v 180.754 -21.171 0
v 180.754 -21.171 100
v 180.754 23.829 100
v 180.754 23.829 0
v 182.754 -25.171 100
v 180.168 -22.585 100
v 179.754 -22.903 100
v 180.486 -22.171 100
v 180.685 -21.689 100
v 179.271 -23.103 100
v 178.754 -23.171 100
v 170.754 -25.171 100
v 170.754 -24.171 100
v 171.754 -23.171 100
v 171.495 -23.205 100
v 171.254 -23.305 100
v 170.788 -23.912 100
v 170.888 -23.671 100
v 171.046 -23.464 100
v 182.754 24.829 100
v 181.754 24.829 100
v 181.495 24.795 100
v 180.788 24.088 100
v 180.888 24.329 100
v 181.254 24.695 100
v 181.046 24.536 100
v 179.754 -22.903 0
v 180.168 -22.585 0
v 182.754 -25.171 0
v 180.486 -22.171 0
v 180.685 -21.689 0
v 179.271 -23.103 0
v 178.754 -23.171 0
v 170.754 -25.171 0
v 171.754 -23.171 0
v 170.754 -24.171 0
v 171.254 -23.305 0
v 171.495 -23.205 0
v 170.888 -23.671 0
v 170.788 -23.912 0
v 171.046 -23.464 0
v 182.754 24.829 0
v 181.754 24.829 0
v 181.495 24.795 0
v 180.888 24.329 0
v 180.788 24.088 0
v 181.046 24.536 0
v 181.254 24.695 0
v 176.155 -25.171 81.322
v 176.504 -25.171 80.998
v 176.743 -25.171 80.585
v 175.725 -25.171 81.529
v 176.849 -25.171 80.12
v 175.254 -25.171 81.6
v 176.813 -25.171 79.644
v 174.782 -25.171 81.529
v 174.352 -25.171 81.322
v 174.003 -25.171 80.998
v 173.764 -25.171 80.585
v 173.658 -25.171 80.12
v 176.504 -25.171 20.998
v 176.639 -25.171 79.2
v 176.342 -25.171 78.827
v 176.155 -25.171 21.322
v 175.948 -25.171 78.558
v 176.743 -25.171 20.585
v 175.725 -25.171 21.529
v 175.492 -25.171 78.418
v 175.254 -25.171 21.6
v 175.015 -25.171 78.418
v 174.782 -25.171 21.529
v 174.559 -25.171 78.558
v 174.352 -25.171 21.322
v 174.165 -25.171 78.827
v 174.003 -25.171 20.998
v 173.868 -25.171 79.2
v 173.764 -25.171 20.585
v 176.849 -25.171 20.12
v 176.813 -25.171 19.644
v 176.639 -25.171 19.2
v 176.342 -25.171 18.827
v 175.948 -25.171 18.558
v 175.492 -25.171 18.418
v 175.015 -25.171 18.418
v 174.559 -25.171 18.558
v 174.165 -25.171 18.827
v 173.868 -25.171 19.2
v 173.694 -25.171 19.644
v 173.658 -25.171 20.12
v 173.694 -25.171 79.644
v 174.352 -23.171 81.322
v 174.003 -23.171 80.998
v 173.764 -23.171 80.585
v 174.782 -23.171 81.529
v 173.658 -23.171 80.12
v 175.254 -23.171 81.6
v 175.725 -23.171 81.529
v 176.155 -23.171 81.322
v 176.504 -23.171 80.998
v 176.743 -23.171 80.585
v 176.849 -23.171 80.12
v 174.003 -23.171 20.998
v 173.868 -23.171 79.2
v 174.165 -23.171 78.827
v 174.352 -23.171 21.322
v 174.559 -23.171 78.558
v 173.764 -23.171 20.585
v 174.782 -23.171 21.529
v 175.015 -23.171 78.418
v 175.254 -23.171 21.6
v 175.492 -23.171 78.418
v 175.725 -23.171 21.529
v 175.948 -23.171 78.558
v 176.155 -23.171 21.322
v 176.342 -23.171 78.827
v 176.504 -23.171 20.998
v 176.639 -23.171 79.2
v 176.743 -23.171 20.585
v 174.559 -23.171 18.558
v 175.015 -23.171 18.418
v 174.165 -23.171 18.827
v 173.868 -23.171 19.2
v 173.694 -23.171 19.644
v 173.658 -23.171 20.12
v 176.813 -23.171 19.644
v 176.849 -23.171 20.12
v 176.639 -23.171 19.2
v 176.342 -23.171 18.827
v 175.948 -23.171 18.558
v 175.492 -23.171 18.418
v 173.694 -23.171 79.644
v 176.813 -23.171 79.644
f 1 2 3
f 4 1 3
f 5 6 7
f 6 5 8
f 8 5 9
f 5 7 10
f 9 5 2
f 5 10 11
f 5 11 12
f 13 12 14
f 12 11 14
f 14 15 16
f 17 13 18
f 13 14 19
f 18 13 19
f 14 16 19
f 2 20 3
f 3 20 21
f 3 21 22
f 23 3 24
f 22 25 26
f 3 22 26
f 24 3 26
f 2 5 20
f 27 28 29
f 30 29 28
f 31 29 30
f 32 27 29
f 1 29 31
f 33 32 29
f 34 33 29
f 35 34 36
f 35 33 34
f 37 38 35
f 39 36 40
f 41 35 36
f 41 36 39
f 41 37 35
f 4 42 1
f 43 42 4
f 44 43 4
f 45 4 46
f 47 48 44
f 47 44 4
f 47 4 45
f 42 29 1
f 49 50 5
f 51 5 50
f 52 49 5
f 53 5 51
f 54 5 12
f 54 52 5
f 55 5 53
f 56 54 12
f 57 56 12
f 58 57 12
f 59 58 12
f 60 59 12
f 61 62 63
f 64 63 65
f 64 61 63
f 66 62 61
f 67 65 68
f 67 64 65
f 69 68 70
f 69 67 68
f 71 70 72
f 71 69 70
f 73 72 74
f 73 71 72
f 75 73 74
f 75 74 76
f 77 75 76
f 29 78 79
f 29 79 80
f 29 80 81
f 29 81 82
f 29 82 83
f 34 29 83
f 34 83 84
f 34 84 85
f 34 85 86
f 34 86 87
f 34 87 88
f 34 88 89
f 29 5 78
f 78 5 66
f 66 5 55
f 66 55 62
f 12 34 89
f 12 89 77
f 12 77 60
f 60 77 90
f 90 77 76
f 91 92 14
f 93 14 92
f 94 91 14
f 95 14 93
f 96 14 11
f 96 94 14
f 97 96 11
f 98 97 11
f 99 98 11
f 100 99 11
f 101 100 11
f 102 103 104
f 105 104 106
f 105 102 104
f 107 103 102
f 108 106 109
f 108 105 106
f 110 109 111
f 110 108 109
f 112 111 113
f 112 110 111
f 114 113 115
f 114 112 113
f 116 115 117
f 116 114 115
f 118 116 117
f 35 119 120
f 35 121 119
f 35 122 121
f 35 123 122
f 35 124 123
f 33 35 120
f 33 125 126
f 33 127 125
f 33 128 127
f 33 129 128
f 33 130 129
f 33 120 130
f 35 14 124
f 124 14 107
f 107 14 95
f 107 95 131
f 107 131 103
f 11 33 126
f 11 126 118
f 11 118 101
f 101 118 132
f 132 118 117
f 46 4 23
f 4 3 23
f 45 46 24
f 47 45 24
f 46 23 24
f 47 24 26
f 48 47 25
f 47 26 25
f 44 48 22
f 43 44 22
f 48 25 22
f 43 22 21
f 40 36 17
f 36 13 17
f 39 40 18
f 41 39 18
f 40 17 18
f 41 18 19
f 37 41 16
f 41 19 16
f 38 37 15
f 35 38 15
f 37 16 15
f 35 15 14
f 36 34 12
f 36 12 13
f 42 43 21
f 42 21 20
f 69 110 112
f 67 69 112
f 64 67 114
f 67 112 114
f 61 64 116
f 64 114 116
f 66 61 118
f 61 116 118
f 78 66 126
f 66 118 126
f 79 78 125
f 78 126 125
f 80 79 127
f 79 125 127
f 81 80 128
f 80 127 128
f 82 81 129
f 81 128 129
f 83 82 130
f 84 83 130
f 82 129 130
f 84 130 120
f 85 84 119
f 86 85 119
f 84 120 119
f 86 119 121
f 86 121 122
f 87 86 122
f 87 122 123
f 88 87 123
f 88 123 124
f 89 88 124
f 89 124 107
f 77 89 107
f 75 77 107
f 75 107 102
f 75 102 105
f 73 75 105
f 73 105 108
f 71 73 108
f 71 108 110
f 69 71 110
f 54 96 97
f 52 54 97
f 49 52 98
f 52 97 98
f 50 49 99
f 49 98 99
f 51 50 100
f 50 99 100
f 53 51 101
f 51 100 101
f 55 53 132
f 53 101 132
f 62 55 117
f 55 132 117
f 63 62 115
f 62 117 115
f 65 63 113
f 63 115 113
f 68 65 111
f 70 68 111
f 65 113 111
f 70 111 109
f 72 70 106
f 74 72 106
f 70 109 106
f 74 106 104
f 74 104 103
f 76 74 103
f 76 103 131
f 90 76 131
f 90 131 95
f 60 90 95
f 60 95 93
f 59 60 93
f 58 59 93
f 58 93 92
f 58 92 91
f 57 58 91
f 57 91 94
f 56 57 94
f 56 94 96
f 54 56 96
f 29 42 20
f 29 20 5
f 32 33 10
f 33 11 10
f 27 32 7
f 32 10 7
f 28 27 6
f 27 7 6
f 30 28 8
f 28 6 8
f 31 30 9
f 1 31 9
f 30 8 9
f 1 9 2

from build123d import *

# Parameters (mm, degrees)
BOSS_EXTRUDE1_DEPTH = 100
FILLET2_R           = 1
FILLET3_R           = 2
SKETCH3_R           = 1.6
CUT_EXTRUDE1_DEPTH  = 214.782256883


with BuildPart() as part:
    # Sketch2 → Boss-Extrude1 (new body)
    with BuildSketch(Plane.XY):
        Polygon((182.753531726, 24.828838313), (182.753531726, -25.171161687), (170.753531726, -25.171161687), (170.753531726, -23.171161687), (180.753531726, -23.171161687), (180.753531726, 24.828838313), align=None)
    extrude(amount=BOSS_EXTRUDE1_DEPTH)

    # Fillet2
    fillet2_edges = [part.edges().sort_by_distance(p)[0] for p in [
        (170.753531726, -23.171161687, 50),
        (180.753531726, 24.828838313, 50),
    ]]
    fillet(fillet2_edges, radius=FILLET2_R)

    # Fillet3
    fillet3_edges = [part.edges().sort_by_distance(p)[0] for p in [
        (180.753531726, -23.171161687, 50),
    ]]
    fillet(fillet3_edges, radius=FILLET3_R)

    # Sketch3 → Cut-Extrude1 (cut, through all)
    with BuildSketch(Plane(origin=(0, -23.171161687, 0), x_dir=(1, 0, 0), z_dir=(0, 1, 0))):
        with Locations(Location((175.253531726, -80, 0), (0, 0, 270))):
            Circle(SKETCH3_R)
        with Locations(Location((175.253531726, -20, 0), (0, 0, 270))):
            Circle(SKETCH3_R)
    extrude(amount=-CUT_EXTRUDE1_DEPTH, mode=Mode.SUBTRACT)


solid = part.part
